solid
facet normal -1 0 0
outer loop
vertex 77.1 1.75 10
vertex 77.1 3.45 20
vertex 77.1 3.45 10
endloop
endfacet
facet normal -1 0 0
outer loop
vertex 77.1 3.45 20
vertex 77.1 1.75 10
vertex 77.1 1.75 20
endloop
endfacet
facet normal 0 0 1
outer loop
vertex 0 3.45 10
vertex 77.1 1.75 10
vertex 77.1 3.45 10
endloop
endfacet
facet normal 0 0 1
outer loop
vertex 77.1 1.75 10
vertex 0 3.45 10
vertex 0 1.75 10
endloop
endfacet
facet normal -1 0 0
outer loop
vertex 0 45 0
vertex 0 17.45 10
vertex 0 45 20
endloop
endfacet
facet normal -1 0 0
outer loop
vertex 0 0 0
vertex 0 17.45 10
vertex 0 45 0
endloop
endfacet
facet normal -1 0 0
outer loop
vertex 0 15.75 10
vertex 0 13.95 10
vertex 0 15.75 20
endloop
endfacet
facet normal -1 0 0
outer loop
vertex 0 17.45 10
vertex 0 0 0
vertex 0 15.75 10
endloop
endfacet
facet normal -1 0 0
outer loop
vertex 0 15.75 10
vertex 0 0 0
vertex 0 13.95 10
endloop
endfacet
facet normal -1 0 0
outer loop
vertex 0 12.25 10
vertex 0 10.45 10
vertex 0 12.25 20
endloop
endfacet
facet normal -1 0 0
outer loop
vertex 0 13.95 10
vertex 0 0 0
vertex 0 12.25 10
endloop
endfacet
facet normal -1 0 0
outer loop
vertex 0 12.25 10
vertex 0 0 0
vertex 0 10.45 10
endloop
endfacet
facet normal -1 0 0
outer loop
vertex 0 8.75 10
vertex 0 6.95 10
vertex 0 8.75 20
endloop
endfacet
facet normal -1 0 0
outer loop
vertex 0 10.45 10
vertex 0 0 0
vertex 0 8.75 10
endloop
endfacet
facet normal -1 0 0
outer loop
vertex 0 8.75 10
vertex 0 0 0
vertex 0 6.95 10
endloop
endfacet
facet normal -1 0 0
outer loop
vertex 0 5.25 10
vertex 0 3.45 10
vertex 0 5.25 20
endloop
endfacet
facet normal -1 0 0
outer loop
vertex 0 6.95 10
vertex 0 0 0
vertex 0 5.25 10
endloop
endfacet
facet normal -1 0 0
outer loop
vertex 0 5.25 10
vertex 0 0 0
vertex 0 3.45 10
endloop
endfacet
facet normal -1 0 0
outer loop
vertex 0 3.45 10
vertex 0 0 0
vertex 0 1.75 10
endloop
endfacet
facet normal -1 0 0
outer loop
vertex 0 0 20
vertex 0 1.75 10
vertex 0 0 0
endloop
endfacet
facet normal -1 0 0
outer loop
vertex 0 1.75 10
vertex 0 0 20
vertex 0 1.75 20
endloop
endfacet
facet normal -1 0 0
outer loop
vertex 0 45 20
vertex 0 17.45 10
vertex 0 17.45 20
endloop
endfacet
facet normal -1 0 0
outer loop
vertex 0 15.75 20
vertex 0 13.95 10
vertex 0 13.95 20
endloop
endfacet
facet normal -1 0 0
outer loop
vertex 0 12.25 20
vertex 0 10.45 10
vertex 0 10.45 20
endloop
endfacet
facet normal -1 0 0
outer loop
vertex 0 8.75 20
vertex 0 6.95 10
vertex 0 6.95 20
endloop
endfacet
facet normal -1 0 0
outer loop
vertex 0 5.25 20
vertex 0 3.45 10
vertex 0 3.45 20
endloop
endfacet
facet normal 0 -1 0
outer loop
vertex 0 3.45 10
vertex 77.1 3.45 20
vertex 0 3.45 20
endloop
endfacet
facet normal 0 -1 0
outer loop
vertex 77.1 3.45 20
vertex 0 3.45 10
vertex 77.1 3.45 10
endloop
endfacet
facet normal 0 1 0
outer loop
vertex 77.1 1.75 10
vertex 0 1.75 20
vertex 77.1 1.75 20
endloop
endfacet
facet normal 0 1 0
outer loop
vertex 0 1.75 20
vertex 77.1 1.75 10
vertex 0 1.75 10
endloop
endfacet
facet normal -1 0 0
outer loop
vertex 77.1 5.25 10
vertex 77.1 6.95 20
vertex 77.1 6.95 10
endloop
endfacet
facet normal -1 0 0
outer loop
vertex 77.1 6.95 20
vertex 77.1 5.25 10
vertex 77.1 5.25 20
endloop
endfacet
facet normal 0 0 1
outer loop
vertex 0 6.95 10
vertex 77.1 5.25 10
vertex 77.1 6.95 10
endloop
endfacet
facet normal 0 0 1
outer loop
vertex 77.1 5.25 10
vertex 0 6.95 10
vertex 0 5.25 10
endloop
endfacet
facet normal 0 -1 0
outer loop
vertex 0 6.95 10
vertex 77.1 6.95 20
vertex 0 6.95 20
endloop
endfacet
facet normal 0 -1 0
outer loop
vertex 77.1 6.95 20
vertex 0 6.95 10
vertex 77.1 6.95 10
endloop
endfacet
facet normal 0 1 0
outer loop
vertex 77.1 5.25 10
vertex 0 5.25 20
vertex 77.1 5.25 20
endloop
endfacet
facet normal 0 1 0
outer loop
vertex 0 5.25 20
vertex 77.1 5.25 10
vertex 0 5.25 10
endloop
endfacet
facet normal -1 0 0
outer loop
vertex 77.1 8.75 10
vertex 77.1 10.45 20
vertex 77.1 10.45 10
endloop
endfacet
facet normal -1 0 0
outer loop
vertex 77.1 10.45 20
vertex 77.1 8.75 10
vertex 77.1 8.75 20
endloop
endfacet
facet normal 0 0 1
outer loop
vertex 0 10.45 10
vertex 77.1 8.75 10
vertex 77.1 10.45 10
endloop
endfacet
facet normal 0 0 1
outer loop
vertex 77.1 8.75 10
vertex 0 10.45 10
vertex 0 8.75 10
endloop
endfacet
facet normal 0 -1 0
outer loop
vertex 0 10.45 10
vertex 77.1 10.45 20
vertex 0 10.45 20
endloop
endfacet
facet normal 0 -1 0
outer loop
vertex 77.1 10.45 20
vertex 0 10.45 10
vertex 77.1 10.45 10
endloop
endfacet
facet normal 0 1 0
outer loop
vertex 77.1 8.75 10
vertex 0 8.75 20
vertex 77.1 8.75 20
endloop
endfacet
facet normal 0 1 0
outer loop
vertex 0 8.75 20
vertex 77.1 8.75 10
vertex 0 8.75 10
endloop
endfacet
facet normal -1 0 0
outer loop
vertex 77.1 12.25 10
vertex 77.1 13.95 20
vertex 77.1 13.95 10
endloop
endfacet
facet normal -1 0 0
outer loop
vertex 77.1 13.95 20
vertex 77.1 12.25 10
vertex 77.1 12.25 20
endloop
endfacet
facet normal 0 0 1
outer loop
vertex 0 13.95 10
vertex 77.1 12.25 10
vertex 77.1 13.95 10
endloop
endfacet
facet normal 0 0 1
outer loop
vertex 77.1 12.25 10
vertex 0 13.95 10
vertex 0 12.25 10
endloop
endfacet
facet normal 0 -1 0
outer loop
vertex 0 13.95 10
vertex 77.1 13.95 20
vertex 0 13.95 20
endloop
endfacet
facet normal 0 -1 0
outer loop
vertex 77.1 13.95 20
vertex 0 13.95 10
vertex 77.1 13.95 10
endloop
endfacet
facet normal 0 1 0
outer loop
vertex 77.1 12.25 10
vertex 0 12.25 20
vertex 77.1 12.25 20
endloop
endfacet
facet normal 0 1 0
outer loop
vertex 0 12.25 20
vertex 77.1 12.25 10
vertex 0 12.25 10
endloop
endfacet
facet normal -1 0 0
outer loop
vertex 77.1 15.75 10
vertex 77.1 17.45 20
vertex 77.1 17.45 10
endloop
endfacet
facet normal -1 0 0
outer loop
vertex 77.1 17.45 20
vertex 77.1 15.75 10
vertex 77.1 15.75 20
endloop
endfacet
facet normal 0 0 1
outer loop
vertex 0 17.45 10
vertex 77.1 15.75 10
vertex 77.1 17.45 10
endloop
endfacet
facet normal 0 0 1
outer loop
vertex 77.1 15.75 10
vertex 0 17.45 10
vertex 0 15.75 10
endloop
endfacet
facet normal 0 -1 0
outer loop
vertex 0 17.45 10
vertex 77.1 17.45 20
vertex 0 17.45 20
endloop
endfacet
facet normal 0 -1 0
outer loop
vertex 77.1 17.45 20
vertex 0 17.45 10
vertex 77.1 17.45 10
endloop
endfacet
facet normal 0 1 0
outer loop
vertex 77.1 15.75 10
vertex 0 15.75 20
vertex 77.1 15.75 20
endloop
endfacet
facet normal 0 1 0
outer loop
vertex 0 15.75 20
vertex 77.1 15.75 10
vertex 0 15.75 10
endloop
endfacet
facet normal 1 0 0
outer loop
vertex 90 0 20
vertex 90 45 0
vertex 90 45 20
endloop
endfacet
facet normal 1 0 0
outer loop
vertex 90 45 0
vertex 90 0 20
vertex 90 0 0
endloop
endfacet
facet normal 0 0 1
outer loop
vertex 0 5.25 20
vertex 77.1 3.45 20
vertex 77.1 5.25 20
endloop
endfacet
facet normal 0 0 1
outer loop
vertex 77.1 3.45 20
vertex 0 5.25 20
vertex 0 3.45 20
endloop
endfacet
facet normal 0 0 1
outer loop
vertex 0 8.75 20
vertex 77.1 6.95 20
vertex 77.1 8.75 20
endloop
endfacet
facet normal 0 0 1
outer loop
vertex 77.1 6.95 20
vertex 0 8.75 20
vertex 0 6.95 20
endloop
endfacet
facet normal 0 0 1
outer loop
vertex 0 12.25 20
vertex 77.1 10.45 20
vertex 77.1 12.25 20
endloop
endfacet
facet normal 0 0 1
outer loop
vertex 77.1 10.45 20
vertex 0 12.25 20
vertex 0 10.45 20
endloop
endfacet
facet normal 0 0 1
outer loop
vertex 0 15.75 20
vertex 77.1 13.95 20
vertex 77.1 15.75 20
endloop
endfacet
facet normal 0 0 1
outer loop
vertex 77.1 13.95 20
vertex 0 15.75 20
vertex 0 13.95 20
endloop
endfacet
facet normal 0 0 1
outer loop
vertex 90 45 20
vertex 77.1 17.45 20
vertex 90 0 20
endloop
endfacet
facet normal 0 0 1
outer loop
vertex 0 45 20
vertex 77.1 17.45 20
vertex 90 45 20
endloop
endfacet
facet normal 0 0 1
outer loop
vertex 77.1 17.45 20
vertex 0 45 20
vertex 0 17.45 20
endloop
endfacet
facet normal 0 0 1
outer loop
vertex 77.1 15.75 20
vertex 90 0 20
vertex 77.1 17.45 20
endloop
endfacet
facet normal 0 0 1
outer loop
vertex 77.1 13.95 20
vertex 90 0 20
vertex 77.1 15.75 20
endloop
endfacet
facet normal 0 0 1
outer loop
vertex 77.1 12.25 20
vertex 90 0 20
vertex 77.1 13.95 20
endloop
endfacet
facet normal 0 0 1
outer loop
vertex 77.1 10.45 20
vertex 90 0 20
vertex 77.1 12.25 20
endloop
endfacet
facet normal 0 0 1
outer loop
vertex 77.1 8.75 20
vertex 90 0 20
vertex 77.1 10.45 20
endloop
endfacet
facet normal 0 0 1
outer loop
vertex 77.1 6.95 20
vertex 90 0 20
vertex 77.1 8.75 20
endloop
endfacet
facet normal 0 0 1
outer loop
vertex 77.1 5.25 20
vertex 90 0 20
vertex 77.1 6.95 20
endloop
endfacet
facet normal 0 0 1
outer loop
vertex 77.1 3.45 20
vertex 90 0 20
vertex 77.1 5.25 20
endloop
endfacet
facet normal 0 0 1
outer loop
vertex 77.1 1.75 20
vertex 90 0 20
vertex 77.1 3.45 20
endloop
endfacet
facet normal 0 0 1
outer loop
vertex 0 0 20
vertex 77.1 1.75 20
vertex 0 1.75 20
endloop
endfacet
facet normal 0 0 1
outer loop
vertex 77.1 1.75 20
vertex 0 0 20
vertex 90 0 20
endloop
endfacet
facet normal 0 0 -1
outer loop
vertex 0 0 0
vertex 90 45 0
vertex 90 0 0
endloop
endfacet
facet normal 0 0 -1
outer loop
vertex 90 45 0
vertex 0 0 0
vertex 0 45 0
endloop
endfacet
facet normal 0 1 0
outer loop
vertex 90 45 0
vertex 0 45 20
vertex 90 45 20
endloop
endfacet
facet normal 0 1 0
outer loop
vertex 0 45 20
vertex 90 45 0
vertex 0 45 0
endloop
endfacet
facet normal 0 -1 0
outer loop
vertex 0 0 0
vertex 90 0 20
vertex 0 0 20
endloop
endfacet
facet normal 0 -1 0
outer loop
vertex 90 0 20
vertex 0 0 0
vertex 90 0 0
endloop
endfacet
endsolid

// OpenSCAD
// Drying Rack for Microscope Slides
// Base: 90 x 45 x 20 mm
// Slots: 10 parallel slots for 75x25mm slides
// Orientation: Rests on XY plane at Z=0, builds upward.

// Base Dimensions
$base_length = 90;   // X
$base_width = 45;    // Y
$base_height = 20;   // Z

// Slide Dimensions (for reference)
$slide_length = 75;  // X
$slide_width = 25;   // Y
$slide_thickness = 1; // Z

// Slot Dimensions
$num_slots = 10;
$slot_length = 77;   // X (slightly longer than slide to allow insertion)
$slot_width = 1.6;   // Y
$slot_depth = 10;    // Z (depth of cut from top)

// Spacing
$slot_spacing = 3.5; // Centre-to-centre distance in Y

// Global settings for smooth curves
$fn = 64;

// Calculate position of the first slot center in Y
// The group of slots is centred on the block in Y.
// Centers are at: -Y_offset, -Y_offset + slot_spacing, ..., +Y_offset
// The distance from center to the last slot center is (num_slots - 1) * slot_spacing / 2
$y_offset_from_center = (($num_slots - 1) * $slot_spacing) / 2;

// Generate the base block
difference() {
    // Main Block
    cube([
        $base_length, 
        $base_width, 
        $base_height
    ]);

    // Cut Slots
    // We iterate through each slot. 
    // Slot centers in Y range from -y_offset_from_center to +y_offset_from_center
    for (i = [0 : $num_slots - 1]) {
        // Calculate Y position for this slot
        $current_y = -($y_offset_from_center) + (i * $slot_spacing);
        
        // Define the slot geometry
        // The slot is a rectangular prism cut from the top face.
        // It runs along X (length $slot_length), is wide in Y ($slot_width), 
        // and deep in Z ($slot_depth).
        // Position: Z starts at ($base_height - $slot_depth) and goes up to $base_height.
        
        translate([
            0,              // X center (slots are centred on block in X)
            $current_y,     // Y position
            $base_height - $slot_depth // Z start position
        ]) {
            // Extend slightly past the faces to ensure clean cut
            cube([
                $slot_length + 0.1, 
                $slot_width + 0.1, 
                $slot_depth + 0.1
            ]);
        }
    }
}
